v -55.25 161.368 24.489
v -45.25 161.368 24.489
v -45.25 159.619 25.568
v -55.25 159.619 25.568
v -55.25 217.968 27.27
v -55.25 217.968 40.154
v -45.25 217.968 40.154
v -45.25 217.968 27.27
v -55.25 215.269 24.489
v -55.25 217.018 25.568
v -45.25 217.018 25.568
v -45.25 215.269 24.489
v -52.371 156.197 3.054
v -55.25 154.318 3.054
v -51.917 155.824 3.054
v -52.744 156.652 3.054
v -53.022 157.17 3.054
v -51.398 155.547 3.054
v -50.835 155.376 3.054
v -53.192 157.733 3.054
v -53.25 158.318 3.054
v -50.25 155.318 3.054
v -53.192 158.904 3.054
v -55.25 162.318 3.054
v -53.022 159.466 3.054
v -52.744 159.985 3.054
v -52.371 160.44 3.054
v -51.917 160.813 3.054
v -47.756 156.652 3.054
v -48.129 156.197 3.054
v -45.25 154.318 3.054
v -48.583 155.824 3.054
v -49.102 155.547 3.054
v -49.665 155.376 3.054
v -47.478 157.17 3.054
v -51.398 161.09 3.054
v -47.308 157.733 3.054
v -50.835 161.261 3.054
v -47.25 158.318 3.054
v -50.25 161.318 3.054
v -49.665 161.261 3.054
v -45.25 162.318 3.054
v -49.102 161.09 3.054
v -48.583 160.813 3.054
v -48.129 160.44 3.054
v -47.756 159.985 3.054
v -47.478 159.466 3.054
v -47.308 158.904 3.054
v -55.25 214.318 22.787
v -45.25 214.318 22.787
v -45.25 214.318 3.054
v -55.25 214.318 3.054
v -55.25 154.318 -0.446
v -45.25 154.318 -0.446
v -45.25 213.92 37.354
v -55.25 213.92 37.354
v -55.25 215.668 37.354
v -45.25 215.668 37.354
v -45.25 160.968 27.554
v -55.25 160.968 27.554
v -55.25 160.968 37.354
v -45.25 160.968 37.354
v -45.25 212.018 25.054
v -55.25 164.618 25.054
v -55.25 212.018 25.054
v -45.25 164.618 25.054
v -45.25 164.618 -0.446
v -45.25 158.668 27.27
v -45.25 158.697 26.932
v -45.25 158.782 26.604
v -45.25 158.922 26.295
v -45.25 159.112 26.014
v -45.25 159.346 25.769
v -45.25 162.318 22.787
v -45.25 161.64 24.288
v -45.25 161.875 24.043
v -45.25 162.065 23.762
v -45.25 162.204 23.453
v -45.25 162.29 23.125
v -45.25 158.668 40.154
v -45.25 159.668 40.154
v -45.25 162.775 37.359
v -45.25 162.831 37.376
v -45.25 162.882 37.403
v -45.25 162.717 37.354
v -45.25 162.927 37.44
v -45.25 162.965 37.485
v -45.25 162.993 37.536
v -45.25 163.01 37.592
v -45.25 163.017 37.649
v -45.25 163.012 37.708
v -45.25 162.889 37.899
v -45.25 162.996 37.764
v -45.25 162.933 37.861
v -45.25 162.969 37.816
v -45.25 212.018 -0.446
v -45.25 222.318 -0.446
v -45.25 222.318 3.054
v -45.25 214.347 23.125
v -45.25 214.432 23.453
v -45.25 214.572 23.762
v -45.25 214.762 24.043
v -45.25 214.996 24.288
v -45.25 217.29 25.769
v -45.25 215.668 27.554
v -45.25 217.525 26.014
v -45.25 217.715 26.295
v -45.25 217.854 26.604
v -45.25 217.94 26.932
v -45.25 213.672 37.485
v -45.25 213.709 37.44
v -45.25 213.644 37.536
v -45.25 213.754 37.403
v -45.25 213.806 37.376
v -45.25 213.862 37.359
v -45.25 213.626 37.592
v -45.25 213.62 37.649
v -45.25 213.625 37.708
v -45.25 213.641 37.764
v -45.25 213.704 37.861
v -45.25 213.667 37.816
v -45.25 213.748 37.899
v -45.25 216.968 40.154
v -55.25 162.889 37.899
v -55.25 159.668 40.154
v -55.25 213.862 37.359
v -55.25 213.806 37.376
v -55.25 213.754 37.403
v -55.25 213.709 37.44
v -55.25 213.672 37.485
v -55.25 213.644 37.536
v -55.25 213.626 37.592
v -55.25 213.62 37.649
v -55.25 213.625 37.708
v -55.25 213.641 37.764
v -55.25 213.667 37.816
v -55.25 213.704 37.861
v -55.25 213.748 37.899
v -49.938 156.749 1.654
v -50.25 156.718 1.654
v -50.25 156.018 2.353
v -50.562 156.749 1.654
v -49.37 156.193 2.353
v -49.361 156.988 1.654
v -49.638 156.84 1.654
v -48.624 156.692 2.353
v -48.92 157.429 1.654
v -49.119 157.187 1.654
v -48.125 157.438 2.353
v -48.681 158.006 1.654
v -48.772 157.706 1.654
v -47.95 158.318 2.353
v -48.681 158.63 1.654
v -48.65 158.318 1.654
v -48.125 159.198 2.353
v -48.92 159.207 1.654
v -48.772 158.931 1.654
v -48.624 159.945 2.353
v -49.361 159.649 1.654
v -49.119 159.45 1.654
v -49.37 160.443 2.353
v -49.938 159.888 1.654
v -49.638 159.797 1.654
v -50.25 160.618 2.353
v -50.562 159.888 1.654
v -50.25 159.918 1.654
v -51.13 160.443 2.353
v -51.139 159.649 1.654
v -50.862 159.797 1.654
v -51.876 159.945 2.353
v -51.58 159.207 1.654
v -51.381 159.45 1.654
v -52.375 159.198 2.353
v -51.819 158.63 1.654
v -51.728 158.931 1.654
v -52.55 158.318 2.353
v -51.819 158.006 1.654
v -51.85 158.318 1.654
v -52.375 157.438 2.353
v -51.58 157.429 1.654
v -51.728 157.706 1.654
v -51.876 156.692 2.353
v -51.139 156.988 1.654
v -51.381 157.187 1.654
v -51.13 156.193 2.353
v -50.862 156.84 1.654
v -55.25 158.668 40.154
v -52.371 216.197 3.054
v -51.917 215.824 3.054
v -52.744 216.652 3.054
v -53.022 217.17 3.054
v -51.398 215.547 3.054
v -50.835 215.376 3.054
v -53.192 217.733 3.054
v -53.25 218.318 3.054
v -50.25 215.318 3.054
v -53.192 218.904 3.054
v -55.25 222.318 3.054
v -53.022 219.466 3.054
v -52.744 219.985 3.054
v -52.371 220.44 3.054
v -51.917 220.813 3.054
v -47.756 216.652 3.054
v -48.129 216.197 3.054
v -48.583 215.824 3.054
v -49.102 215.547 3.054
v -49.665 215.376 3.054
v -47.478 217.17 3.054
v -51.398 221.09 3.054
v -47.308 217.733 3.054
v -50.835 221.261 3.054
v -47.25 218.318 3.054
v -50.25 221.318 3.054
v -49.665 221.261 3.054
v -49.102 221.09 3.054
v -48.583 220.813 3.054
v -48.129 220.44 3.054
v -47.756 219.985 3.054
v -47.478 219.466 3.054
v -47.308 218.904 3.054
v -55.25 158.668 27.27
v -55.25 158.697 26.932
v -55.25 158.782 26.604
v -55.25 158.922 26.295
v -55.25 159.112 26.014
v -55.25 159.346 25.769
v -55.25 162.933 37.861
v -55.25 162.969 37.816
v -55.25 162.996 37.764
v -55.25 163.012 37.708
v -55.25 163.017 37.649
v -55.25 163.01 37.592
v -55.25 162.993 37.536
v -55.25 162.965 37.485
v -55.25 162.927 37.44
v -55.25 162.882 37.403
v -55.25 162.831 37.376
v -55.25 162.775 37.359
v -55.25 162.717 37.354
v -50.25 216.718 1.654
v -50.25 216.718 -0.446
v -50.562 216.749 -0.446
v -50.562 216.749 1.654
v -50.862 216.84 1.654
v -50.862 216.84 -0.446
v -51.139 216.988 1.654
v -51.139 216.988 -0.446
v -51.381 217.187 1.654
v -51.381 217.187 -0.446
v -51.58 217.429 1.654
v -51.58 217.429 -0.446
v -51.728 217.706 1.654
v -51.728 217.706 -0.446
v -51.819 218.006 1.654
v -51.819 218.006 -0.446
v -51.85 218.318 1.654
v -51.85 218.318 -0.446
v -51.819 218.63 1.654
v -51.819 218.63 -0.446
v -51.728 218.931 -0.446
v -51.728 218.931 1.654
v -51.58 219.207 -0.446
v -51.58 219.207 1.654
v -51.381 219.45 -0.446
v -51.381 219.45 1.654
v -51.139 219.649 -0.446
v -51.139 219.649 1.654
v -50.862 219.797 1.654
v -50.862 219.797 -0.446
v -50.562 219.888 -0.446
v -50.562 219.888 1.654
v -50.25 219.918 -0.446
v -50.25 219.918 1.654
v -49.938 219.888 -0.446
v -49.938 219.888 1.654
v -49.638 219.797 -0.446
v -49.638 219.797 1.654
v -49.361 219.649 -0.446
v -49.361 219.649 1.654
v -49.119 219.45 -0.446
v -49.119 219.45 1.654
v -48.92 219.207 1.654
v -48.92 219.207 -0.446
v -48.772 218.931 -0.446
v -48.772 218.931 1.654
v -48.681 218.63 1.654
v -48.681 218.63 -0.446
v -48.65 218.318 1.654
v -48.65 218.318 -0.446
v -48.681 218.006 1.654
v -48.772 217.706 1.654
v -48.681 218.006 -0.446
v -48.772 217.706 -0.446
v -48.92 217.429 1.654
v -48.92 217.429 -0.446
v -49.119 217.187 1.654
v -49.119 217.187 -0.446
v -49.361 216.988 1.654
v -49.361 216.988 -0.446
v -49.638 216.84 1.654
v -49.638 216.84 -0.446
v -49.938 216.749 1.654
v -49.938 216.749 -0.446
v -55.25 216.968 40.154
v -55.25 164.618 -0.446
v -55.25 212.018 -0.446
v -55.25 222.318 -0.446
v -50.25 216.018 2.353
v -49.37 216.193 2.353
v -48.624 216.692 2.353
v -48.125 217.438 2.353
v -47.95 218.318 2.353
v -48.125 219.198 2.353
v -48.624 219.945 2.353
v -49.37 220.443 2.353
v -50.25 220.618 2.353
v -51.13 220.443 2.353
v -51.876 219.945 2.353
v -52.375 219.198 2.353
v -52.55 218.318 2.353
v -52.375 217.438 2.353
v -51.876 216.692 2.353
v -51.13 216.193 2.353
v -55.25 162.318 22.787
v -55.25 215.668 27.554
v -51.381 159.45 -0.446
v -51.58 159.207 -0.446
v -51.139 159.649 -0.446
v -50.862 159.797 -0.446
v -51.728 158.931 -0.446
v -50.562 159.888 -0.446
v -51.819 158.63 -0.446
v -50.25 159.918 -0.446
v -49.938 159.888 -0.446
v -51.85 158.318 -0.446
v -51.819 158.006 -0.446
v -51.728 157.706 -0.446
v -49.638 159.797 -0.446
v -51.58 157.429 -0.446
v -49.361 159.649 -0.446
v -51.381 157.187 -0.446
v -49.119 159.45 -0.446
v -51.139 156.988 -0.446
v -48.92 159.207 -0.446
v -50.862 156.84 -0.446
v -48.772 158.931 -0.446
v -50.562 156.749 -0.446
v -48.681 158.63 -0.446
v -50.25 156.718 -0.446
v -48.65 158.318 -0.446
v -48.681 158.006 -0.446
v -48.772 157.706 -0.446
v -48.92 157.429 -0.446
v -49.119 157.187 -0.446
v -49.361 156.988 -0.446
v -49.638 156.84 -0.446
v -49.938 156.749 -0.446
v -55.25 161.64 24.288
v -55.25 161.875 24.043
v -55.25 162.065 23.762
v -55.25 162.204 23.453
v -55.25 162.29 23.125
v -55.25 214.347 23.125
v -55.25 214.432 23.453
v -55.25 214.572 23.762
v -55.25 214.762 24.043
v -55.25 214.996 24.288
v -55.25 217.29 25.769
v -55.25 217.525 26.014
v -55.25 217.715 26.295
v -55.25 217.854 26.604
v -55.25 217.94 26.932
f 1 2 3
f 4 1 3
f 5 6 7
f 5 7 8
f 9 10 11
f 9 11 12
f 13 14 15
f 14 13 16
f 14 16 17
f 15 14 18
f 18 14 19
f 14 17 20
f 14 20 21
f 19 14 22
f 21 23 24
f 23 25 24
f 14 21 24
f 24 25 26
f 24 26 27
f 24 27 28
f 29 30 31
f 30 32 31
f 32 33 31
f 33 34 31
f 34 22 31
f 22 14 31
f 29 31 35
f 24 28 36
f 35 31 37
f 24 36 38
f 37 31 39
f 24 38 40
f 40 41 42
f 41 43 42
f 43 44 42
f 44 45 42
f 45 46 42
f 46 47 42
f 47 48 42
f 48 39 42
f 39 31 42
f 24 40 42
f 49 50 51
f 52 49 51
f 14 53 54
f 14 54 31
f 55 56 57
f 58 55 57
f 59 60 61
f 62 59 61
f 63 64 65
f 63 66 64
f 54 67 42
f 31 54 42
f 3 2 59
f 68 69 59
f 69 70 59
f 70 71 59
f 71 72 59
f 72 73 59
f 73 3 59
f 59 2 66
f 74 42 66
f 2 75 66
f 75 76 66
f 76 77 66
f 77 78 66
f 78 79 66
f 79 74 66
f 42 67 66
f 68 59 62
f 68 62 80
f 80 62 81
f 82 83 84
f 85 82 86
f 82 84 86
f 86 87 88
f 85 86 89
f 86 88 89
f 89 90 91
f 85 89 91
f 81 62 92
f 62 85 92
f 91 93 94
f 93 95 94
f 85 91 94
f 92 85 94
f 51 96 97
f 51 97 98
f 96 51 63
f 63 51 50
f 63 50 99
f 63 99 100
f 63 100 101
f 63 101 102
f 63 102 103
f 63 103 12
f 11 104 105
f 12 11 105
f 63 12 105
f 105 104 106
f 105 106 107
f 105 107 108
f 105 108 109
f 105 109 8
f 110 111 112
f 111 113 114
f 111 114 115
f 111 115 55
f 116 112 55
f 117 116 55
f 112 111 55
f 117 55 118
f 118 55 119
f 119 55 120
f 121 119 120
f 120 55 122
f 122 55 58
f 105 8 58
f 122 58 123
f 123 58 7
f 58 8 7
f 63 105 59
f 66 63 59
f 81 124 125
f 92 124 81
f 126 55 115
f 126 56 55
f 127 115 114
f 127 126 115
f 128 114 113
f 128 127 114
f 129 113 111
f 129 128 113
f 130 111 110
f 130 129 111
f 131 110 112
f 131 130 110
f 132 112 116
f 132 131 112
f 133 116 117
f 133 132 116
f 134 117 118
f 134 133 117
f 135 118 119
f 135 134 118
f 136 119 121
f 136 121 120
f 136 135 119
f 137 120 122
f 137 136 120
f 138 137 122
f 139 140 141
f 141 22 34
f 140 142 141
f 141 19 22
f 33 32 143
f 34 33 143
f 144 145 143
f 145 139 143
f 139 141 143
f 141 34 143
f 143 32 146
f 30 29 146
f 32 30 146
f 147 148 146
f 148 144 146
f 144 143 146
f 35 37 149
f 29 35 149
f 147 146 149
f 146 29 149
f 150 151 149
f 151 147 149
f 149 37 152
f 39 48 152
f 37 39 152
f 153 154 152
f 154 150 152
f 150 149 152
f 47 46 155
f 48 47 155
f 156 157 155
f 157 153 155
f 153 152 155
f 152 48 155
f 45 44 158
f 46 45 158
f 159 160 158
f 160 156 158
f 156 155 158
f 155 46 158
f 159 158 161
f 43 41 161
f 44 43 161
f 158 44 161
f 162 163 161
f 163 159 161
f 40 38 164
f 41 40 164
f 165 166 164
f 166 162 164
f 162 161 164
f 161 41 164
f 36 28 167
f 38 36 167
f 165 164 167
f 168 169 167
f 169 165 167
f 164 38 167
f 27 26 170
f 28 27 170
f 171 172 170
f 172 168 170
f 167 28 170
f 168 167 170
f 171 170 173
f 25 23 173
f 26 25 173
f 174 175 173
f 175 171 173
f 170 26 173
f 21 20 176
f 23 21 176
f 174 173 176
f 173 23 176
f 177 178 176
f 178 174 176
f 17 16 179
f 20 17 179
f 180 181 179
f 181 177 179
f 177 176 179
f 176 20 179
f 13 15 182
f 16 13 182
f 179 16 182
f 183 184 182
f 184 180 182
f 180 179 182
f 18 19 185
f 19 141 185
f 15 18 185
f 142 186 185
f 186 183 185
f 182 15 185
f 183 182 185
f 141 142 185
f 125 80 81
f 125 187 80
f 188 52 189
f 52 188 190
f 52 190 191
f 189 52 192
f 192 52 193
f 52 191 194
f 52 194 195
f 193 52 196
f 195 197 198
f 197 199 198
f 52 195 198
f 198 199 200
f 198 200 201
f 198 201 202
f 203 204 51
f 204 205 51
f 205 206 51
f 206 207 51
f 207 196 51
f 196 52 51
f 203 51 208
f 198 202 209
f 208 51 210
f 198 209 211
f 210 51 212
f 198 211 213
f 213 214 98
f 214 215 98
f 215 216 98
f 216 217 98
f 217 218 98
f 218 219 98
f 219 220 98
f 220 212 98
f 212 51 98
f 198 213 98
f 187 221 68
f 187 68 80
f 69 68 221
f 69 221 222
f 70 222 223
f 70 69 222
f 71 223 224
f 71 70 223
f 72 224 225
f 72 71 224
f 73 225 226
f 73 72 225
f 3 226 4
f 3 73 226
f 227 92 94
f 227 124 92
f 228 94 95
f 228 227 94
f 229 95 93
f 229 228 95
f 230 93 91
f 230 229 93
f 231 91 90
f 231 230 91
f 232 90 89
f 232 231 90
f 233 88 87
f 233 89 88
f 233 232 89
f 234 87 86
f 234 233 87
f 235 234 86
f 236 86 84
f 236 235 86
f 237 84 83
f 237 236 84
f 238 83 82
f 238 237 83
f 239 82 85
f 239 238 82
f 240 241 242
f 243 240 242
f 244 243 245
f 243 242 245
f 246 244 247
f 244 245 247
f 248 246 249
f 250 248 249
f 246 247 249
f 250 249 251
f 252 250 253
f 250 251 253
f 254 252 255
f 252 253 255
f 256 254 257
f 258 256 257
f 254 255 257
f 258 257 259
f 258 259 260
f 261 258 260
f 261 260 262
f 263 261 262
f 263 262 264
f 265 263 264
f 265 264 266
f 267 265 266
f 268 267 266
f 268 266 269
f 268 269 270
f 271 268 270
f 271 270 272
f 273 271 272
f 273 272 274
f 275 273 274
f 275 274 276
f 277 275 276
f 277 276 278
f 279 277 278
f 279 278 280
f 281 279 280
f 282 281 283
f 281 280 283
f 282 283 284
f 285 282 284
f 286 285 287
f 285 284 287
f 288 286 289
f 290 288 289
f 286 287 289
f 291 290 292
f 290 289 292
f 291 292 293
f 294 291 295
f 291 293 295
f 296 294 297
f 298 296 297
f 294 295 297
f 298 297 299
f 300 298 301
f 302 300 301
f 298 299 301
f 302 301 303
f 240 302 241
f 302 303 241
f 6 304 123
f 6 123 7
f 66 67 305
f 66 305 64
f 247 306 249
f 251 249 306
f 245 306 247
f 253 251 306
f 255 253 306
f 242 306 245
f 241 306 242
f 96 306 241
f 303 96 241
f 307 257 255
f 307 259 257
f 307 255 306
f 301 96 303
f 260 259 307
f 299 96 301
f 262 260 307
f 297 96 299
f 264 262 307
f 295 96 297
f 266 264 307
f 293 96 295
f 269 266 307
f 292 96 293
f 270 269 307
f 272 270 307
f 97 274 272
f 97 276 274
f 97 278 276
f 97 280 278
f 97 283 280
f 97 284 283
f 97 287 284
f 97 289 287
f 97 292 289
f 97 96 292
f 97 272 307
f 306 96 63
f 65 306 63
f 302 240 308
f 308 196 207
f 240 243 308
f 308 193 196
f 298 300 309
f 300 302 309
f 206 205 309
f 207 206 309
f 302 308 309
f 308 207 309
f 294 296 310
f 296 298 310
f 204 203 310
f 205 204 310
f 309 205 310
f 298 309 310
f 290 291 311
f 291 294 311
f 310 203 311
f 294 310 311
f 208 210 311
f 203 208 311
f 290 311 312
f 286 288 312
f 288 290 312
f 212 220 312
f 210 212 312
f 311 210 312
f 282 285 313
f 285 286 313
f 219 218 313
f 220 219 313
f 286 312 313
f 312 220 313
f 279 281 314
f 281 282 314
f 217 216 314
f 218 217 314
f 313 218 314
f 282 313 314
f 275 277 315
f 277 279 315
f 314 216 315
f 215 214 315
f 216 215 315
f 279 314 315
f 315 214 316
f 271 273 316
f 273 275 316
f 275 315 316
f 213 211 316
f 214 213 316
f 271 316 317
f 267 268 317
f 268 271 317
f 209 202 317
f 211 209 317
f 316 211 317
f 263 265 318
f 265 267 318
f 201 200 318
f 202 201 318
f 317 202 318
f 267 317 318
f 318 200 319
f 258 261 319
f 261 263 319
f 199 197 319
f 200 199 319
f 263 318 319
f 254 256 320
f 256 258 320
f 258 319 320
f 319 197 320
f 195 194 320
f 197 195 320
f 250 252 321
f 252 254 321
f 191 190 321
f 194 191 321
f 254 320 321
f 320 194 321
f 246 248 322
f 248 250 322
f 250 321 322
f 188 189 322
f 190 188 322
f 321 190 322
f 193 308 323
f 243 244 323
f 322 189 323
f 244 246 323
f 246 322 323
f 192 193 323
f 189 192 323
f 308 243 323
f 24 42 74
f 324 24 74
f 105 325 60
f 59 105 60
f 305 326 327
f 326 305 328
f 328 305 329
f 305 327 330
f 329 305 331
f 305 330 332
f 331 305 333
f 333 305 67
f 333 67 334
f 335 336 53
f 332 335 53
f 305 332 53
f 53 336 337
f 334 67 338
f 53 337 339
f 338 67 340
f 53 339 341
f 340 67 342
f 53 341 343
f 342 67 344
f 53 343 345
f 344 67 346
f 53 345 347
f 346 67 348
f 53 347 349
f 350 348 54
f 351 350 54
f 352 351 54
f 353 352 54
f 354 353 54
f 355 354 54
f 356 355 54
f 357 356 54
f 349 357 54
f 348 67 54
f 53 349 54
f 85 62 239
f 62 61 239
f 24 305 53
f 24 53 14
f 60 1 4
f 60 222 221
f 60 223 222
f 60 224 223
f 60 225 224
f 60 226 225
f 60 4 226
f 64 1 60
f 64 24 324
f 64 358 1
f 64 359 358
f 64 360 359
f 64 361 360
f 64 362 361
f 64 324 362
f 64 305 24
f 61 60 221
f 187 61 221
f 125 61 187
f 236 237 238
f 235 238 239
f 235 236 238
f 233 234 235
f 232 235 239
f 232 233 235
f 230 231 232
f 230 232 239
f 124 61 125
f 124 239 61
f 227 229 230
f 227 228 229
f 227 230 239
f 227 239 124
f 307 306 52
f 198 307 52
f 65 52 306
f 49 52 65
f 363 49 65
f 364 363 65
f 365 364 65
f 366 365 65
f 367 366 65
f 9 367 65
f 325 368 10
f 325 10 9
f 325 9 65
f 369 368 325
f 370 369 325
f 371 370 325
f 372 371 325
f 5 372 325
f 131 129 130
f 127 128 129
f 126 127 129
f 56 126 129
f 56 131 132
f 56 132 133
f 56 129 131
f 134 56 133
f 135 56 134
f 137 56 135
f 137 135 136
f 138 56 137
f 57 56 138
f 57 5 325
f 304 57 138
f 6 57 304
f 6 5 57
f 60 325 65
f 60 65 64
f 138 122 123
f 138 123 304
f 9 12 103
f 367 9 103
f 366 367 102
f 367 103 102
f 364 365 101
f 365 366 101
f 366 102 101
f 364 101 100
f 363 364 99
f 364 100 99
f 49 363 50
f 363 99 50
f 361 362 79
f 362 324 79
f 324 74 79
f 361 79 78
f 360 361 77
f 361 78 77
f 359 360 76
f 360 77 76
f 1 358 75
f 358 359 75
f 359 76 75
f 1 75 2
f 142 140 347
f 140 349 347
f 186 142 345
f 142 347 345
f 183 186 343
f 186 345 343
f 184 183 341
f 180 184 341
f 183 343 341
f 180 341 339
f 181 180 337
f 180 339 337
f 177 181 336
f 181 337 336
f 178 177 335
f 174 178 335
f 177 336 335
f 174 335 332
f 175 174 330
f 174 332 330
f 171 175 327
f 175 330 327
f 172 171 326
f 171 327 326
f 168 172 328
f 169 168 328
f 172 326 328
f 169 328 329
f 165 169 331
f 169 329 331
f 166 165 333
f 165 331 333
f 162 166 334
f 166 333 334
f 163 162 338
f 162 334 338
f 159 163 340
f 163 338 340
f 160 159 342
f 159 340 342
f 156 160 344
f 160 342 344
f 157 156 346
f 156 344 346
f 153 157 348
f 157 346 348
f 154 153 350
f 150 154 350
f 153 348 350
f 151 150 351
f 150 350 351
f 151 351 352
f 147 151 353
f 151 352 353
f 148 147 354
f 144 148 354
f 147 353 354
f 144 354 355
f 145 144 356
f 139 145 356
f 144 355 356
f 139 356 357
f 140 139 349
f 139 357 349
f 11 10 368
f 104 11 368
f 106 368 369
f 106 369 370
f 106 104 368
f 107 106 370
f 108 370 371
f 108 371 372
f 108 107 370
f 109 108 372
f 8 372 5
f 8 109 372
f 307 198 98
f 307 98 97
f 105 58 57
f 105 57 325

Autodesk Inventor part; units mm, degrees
ref_plane "YZ Plane" through (0, 0, 0) normal (1, 0, 0) x (0, 1, 0)
ref_plane "XZ Plane" through (0, 0, 0) normal (0, 1, 0) x (-1, 0, 0)
ref_plane "Work Plane4" through (-45.25, 257.5287, -0.5) normal (1, 0, 0) x (0, -1, 0)
sketch "Sketch5" plane through (-45.25, 257.5287, -0.5) normal (1, 0, 0) x (0, -1, 0)
  line L0 (45.7104, -25.5535) -> (92.7104, -25.5535)
  line L1 (92.7104, -25.5535) -> (92.7104, -0.0535)
  line L2 (45.7104, -0.0535) -> (45.7104, -25.5535)
  line L3 (95.2104, -28.0535) -> (43.2104, -28.0535)
  line L4 (43.2104, -28.0535) -> (43.2104, -3.5535)
  line L5 (103.2104, -0.0535) -> (103.2104, -3.5535)
  line L6 (103.2104, -3.5535) -> (95.2104, -3.5535)
  line L7 (92.7104, -0.0535) -> (103.2104, -0.0535)
  line L8 (95.2104, -3.5535) -> (95.2104, -28.0535)
  line L9 (43.2104, -3.5535) -> (35.2104, -3.5535)
  line L10 (35.2104, -3.5535) -> (35.2104, -0.0535)
  line L11 (45.7104, -0.0535) -> (35.2104, -0.0535)
  point P0 (257.5287, -0.5)
  dimension "d10" = 2.5
  dimension "d11" = 3.5
  dimension "d12" = 2.5
  dimension "d13" = 8
  dimension "d14" = 2.5
  dimension "d17" = 8
  dimension "d40" = 47
  dimension "d41" = 25.5
extrude "Extrusion2" add sketch "Sketch5" against normal blind 10
sketch "Sketch6" plane through (-45.25, 154.3183, 3.0535) normal (0, 0, 1) x (1, 0, 0)
  line L0 (0, 68) -> (0, 60) projected
  line L1 (0, 68) -> (-10, 68) projected
  line L2 (-10, 60) -> (-10, 68) projected
  line L3 (0, 60) -> (-10, 60) projected
  line L4 (0, 8) -> (0, 0) projected
  line L5 (0, 8) -> (-10, 8) projected
  line L6 (-10, 0) -> (-10, 8) projected
  line L7 (0, 0) -> (-10, 0) projected
  line L8 (-10, 68) -> (0, 60) construction
  line L9 (0, 68) -> (-10, 60) construction
  line L10 (0, 8) -> (-10, 8) construction
  line L11 (-10, 8) -> (0, 0) construction
  line L12 (0, 8) -> (-10, 0) construction
  point P0 (45.25, -154.3183)
  point P1 (-5, 64)
  point P2 (-5, 4)
hole "Hole1" at (-50.25, 218.3183, 3.0535) at (-50.25, 158.3183, 3.0535) direction (0, 0, -1) diameter 3.2 end through all countersink diameter 6 countersink angle 90
sketch "Sketch7" plane through (-55.25, 257.5287, -0.5) normal (-1, 0, 0) x (0, 0, 1)
  line L0 (37.6535, -68.1104) -> (35.0535, -68.1104) projected
  line L1 (35.0535, -68.1104) -> (35.0535, -70.3104) projected
  line L2 (35.0535, -70.3104) -> (37.6535, -70.3104) projected
  line L3 (37.6535, -70.3104) -> (37.6535, -96.3604) projected
  line L4 (37.6535, -96.3604) -> (28.0535, -96.3604) projected
  line L5 (28.0535, -96.3604) -> (28.0535, -42.0604) projected
  line L6 (37.6535, -42.0604) -> (28.0535, -42.0604) construction
  line L7 (37.6535, -42.0604) -> (37.6535, -68.1104) construction
  line L8 (37.6535, -44.5604) -> (40.6535, -44.5604)
  line L9 (40.6535, -44.5604) -> (40.6535, -39.5604)
  line L10 (40.6535, -39.5604) -> (26.6535, -39.5604)
  line L11 (26.6535, -39.5604) -> (24.4035, -43.2104)
  line L12 (3.5535, -43.2104) -> (28.0535, -43.2104) projected
  line L13 (28.0535, -43.2104) -> (24.4035, -43.2104)
  line L14 (37.8535, -44.5604) -> (37.8535, -41.8604)
  line L15 (37.8535, -41.8604) -> (28.0535, -41.8604)
  line L16 (28.0535, -41.8604) -> (28.0535, -42.0604)
  point P0 (0.5, -257.5287)
  dimension "d42" = 2.5
  dimension "d43" = 3
  dimension "d44" = 5
  dimension "d45" = 3.65
  dimension "d46" = 14
  dimension "d47" = 9.6
  dimension "d48" = 3.65
  dimension "d49" = 0.2
  dimension "d50" = 0.2
extrude "Extrusion3" add sketch "Sketch7" against normal blind 10
chamfer "Chamfer1" distance 4 distance2 2.8 1 edges at (-50.25, 212.9683, 40.1535) measured on face at (-51.9167, 214.6349, 40.1535)
fillet "Fillet2" radius 0.3 2 edges at (-50.25, 212.9683, 37.3536) (-50.25, 212.9683, 37.3535)
ref_plane "Work Plane5" through (-45.25, 188.3183, 3.0535) normal (0, -1, 0) x (1, 0, 0)
mirror "Mirror2" about plane through (-45.25, 188.3183, 3.0535) normal (0, -1, 0) of "Extrusion3", "Fillet2", "Chamfer1"
sketch "Sketch8" plane through (-45.25, 257.5287, -0.5) normal (1, 0, 0) x (0, 0, -1)
  line L0 (-25.5535, -45.7104) -> (-0.0535, -45.7104) projected
  line L1 (-25.5535, -45.7104) -> (-0.0535, -45.7104)
  line L2 (-0.0535, -45.7104) -> (-0.0535, -45.5104)
  line L3 (-0.0535, -45.5104) -> (-25.5535, -45.5104)
  line L4 (-25.5535, -45.5104) -> (-25.5535, -45.7104)
  line L5 (-0.0535, -92.7104) -> (-25.5535, -92.7104) projected
  line L6 (-25.5535, -92.7104) -> (-0.0535, -92.7104)
  line L7 (-0.0535, -92.7104) -> (-0.0535, -92.9104)
  line L8 (-0.0535, -92.9104) -> (-25.5535, -92.9104)
  line L9 (-25.5535, -92.9104) -> (-25.5535, -92.7104)
  point P0 (-0.5, -257.5287)
  dimension "d51" = 0.2
  dimension "d52" = 0.2
extrude "Extrusion4" cut sketch "Sketch8" against normal through all
fillet "Fillet3" radius 2 4 edges at (-50.25, 217.9683, 26.1535) (-50.25, 214.3183, 23.9035) (-50.25, 158.6683, 26.1535) (-50.25, 162.3183, 23.9035)
equation "\"d12\" = d10"
equation "\"d14\" = d10"
equation "\"d17\" = d13"
equation "\"d45\" = d48"
properties part number "batteryHolder"
